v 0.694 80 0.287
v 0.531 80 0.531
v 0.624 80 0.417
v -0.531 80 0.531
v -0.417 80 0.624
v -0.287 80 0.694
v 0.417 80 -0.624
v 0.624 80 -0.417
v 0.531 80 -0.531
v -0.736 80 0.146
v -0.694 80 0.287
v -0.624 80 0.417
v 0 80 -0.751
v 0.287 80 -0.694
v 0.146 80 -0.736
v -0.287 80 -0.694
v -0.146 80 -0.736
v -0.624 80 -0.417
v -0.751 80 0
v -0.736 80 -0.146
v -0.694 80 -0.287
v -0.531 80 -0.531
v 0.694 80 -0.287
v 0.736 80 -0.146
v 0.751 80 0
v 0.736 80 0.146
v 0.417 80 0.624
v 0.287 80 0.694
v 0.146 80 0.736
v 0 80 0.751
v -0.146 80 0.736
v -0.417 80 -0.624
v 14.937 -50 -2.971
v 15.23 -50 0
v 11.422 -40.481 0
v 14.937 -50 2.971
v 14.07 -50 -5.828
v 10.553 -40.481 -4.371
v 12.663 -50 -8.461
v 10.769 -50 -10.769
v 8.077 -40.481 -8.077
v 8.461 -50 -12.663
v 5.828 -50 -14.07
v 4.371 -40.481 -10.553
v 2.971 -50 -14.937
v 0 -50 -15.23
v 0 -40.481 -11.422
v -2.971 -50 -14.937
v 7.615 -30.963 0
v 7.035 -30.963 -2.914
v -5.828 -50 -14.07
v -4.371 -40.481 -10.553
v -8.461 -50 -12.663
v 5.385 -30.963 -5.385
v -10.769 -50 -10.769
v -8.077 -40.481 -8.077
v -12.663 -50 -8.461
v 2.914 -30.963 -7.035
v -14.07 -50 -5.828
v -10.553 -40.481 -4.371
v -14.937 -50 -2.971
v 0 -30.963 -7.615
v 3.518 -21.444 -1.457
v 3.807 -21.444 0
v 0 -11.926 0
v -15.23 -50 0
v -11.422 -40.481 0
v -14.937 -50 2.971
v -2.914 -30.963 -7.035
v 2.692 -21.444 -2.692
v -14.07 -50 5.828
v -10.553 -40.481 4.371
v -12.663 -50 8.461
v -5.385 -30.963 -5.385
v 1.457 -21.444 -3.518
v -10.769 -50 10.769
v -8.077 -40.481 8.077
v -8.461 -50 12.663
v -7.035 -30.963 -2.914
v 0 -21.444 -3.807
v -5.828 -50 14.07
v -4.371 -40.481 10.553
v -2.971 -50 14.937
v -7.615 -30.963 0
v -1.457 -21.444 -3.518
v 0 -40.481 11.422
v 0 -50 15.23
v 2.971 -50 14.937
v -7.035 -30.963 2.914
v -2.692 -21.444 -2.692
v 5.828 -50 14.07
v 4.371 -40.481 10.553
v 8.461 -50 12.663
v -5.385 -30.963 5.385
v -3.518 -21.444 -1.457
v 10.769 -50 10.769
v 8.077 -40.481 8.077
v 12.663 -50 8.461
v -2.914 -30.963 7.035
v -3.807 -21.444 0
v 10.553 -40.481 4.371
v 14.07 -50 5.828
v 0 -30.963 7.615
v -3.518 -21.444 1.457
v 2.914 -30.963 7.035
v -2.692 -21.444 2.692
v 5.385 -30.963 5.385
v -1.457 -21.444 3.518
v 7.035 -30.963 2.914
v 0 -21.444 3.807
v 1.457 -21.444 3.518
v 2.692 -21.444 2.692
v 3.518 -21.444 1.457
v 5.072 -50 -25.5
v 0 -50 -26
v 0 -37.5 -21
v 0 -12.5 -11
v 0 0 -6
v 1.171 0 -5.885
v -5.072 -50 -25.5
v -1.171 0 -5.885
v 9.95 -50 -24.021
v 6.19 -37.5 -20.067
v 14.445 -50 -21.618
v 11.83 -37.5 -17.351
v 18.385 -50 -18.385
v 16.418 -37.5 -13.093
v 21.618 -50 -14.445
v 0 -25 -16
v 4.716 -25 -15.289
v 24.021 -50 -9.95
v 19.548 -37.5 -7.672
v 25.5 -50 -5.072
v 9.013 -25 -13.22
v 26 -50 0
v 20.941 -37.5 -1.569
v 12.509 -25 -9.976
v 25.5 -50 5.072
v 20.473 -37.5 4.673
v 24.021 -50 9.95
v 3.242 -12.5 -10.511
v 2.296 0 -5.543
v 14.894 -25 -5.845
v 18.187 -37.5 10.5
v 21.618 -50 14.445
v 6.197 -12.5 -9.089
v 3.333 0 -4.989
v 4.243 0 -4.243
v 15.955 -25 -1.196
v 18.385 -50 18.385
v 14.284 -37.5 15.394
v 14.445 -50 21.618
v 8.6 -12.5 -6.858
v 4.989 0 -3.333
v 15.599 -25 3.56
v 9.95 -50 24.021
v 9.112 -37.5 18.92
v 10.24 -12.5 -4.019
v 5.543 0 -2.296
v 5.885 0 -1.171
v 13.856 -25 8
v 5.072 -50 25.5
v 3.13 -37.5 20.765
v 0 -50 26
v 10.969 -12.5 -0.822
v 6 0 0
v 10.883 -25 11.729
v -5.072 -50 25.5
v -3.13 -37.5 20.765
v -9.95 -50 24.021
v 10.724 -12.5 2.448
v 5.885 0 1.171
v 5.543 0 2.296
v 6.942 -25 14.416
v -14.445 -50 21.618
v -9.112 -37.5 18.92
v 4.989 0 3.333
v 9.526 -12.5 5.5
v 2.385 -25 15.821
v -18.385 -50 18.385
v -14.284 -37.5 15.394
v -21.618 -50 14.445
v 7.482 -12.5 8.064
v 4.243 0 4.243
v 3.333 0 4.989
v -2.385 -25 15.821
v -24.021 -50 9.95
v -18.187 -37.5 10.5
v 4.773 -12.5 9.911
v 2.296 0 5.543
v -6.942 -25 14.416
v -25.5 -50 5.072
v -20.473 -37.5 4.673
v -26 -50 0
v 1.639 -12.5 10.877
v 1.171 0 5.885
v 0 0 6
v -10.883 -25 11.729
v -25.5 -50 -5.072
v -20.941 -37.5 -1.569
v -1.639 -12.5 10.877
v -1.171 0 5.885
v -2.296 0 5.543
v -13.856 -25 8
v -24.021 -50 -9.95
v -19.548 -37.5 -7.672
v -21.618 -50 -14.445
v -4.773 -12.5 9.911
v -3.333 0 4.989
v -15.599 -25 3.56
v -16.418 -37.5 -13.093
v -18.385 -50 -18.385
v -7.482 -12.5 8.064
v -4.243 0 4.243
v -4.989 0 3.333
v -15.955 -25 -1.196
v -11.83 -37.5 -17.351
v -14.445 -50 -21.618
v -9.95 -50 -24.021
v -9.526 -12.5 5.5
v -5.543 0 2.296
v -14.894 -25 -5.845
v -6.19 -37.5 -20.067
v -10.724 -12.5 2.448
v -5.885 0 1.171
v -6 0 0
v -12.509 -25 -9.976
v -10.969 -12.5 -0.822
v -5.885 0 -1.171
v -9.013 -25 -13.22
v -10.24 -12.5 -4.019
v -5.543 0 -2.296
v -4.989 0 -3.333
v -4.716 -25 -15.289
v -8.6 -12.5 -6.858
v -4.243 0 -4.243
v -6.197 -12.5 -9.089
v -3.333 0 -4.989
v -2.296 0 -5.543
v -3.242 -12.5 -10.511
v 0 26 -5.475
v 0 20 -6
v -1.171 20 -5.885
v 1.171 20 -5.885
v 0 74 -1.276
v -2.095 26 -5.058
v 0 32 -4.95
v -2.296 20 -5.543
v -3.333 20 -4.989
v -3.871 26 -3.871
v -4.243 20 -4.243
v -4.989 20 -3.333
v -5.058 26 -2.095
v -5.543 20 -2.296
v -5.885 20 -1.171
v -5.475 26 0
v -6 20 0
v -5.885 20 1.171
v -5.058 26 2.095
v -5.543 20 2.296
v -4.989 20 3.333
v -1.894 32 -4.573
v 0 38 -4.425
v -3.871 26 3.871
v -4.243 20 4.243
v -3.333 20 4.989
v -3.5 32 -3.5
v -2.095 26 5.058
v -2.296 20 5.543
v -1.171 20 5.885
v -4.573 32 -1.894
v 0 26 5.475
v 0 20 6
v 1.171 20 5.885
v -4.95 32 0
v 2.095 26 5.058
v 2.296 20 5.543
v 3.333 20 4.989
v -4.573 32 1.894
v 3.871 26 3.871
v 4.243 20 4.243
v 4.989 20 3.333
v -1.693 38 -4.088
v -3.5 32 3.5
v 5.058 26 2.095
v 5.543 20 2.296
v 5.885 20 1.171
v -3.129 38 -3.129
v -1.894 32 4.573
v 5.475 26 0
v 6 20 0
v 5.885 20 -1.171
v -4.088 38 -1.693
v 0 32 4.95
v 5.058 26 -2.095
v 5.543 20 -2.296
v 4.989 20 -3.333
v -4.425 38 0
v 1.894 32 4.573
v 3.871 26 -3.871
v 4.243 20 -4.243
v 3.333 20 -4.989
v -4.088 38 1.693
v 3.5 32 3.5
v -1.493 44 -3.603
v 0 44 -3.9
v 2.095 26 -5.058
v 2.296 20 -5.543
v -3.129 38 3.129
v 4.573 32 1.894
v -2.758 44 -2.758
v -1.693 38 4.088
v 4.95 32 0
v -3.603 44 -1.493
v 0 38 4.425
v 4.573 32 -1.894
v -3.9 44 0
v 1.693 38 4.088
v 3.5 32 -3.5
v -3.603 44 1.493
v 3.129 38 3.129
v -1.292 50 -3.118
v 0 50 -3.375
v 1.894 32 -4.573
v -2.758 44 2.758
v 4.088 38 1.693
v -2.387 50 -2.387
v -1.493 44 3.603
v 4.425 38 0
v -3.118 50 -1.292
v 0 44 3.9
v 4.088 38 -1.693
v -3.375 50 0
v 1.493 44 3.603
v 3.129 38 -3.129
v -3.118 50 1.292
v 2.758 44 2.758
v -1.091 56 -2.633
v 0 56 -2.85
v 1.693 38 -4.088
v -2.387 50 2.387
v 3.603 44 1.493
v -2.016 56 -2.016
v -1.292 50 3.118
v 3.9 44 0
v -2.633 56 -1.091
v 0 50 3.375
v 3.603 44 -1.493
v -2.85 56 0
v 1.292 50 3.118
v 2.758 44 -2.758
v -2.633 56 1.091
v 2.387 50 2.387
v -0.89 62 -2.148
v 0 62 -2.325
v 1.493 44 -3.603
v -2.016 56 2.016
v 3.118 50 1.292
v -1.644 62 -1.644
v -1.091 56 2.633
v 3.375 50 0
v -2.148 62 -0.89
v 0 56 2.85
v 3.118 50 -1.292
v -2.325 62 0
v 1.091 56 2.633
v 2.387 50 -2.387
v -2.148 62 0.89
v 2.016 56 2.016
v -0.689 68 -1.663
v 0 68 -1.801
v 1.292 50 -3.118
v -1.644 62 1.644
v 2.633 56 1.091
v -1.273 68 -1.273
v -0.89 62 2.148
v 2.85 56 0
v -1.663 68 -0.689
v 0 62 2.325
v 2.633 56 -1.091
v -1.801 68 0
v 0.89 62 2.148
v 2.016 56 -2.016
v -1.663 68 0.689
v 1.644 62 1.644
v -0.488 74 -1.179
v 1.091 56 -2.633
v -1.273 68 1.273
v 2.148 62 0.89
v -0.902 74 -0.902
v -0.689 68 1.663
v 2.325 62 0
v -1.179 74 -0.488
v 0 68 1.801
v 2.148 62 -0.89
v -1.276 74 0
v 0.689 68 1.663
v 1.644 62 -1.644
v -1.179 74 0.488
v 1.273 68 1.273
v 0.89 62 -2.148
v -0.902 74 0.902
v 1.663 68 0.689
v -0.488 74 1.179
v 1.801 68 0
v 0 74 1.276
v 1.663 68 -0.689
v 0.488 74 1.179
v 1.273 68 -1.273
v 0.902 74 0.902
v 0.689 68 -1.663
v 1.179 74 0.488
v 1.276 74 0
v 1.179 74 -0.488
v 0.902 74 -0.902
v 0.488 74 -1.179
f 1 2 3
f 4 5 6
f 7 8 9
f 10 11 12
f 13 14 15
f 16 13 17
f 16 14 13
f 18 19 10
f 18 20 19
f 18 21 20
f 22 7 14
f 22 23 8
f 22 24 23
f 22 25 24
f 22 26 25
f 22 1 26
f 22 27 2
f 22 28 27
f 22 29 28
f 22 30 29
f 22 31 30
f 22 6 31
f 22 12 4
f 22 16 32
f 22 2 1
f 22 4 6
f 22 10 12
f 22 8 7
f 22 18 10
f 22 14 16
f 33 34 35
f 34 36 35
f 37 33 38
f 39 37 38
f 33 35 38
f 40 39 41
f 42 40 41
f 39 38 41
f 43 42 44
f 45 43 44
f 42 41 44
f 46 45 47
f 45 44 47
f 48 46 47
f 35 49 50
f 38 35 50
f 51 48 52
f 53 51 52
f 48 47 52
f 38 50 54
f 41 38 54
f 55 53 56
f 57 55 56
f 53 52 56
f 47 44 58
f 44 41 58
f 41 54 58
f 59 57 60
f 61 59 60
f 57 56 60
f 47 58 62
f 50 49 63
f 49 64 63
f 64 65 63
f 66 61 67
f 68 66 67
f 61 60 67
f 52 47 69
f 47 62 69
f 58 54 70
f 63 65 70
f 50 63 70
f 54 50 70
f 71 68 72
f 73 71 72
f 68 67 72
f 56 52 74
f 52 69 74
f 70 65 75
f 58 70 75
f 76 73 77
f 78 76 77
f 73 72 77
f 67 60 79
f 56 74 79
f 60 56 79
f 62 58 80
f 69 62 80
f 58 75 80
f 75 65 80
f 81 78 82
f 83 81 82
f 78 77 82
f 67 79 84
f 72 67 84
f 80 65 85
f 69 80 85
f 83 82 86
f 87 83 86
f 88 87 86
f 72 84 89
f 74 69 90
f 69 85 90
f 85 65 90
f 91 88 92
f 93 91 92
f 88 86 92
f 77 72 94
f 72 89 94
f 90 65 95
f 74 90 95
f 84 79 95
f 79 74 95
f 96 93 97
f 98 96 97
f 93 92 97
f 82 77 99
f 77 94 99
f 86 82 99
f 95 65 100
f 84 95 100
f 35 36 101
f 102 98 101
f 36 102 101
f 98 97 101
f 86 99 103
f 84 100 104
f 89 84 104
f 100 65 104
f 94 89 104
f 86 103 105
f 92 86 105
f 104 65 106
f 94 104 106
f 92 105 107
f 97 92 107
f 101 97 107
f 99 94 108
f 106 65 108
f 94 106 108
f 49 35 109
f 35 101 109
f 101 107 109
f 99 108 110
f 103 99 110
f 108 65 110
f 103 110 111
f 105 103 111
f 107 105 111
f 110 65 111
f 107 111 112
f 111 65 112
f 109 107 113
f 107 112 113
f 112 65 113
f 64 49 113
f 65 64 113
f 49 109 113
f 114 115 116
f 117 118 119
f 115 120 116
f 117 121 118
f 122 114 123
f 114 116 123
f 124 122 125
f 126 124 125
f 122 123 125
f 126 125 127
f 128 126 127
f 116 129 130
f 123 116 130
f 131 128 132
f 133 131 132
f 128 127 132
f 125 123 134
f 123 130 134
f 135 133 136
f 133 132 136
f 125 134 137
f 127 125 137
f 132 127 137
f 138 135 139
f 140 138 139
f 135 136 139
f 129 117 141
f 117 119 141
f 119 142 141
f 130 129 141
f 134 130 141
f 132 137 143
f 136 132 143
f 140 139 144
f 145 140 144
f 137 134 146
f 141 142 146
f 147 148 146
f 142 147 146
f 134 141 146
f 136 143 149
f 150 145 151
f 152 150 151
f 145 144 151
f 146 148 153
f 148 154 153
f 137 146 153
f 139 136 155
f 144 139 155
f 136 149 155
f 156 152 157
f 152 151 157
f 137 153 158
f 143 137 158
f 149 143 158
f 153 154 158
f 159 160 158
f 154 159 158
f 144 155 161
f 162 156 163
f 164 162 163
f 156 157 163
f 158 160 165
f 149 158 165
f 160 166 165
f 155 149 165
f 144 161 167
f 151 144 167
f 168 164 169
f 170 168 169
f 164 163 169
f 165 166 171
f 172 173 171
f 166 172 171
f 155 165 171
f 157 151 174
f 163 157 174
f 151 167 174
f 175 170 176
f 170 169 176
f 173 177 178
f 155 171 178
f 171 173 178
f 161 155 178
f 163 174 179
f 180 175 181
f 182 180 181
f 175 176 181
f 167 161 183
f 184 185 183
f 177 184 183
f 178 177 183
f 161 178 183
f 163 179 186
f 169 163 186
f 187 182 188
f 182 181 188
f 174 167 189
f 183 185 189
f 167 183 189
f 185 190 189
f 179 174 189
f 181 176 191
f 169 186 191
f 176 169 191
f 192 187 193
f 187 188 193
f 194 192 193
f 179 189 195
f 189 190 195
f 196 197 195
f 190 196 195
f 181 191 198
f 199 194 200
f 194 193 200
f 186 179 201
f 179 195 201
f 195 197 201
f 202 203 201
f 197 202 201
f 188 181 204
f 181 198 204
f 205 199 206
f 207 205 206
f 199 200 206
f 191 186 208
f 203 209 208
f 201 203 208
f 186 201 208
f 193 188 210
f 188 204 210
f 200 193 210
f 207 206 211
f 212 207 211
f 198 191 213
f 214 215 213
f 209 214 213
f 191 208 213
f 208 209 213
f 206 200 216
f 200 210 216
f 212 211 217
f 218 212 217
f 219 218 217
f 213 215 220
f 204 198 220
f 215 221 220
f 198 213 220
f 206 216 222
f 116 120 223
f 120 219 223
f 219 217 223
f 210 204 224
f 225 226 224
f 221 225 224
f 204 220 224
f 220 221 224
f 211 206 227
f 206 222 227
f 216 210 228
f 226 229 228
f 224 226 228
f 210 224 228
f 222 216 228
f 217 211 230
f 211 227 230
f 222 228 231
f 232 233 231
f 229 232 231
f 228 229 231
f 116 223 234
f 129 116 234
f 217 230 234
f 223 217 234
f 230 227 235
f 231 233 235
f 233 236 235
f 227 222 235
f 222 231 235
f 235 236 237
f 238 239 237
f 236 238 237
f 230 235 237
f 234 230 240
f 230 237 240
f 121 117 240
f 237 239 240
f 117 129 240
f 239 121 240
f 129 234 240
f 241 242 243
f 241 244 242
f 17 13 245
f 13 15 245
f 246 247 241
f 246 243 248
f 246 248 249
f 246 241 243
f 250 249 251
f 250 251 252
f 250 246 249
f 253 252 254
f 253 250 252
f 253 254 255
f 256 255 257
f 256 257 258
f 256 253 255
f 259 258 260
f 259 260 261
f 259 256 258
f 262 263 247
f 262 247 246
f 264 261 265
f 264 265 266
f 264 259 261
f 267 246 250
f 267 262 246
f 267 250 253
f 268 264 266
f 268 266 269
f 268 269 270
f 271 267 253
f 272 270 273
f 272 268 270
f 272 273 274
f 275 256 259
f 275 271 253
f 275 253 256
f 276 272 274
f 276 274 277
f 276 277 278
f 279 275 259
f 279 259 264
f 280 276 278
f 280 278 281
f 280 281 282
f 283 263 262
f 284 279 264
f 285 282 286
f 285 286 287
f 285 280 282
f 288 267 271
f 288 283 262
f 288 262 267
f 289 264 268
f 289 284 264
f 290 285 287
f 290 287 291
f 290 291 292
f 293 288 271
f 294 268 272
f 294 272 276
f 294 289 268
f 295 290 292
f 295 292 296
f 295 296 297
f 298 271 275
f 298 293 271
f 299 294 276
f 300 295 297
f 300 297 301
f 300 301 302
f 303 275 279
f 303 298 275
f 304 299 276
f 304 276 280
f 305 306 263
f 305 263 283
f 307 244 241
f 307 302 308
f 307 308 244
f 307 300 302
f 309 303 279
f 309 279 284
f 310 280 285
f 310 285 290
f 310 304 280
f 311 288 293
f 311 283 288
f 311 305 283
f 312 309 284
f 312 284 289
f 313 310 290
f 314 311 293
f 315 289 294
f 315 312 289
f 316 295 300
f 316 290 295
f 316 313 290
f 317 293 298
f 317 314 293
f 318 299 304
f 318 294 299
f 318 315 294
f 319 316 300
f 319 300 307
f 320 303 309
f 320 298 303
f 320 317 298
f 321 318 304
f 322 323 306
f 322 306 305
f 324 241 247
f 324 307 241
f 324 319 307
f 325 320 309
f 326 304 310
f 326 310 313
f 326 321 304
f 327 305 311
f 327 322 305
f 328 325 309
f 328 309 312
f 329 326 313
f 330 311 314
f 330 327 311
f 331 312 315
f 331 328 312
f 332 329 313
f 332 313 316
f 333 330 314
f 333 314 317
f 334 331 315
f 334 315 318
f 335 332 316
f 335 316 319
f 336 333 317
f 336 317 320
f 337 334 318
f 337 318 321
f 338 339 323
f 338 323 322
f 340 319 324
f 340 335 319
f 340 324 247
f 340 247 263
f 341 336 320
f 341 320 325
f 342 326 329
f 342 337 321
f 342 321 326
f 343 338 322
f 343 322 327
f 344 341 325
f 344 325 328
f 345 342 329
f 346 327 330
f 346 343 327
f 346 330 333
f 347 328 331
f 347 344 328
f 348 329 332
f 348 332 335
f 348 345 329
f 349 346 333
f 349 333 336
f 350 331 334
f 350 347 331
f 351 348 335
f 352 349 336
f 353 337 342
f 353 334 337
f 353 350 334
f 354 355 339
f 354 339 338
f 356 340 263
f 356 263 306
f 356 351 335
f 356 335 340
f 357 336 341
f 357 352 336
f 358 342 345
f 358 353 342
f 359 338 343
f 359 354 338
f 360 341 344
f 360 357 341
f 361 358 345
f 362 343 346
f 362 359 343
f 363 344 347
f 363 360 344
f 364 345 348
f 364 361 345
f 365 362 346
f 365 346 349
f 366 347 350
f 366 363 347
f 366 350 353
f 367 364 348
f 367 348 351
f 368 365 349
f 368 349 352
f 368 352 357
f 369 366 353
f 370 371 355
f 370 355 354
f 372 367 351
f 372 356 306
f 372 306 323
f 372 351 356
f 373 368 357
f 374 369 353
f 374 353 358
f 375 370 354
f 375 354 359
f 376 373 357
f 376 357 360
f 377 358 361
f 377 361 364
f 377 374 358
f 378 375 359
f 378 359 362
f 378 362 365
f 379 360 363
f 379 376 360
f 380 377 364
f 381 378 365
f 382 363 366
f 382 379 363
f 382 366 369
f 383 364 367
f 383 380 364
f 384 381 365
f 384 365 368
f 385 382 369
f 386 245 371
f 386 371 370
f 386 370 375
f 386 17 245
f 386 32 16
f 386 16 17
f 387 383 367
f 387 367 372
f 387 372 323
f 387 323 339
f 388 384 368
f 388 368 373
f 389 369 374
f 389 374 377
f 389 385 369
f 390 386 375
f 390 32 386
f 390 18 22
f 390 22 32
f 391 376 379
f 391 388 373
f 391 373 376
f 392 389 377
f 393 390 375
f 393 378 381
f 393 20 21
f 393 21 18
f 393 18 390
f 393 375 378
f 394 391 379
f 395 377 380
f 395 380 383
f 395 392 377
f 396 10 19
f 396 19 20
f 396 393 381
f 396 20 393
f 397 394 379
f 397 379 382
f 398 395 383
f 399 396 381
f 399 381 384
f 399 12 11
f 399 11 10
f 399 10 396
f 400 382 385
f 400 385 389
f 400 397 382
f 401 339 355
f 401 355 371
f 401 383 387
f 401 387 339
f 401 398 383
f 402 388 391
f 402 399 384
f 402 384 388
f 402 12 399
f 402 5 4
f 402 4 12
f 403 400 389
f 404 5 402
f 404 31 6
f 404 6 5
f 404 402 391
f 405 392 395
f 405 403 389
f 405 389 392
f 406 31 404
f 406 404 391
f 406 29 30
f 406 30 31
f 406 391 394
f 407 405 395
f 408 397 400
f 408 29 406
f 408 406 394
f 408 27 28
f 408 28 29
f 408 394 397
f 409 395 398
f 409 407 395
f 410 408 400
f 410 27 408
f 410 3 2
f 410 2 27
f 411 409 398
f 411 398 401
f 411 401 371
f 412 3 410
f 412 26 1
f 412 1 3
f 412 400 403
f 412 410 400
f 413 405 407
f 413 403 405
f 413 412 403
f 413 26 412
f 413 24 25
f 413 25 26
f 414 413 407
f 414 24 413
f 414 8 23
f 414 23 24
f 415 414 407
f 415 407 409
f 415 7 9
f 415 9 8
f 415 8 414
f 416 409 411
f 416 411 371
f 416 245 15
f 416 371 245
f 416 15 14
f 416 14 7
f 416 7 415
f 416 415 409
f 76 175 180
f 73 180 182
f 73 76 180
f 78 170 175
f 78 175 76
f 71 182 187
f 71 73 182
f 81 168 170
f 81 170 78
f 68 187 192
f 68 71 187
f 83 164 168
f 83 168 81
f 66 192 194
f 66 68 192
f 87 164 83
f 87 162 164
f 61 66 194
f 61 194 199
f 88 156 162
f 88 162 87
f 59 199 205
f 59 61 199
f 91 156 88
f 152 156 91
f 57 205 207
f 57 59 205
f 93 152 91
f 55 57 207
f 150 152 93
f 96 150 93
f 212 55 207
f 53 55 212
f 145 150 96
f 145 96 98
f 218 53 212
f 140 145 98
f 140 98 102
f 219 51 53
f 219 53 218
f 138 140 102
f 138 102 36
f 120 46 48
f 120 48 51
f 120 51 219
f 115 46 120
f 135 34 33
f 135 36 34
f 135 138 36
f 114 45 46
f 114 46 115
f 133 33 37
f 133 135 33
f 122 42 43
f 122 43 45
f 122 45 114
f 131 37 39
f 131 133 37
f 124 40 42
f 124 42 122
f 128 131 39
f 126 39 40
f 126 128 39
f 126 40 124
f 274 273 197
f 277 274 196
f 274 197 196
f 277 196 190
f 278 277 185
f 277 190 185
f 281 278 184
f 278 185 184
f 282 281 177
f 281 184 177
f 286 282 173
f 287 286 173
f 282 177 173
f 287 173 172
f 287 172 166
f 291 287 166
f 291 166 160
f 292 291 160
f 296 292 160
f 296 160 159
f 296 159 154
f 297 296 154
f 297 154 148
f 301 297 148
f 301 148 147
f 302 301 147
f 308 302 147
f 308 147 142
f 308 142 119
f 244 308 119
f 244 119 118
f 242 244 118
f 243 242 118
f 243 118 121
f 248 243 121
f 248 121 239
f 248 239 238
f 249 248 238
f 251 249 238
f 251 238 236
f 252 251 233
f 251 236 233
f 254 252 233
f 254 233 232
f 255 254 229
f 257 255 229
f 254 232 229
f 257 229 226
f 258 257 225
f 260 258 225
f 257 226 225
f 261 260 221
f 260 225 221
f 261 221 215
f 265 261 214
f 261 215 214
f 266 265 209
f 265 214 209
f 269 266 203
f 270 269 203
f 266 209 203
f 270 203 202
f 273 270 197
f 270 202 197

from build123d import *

# Parameters (mm, degrees)
SKETCH1_R           = 6
BOSS_EXTRUDE1_DEPTH = 20
SKETCH2_R           = 26
BOSS_EXTRUDE2_DEPTH = 50
CHAMFER1_SIZE       = 50
CHAMFER1_SIZE_2     = 20
SKETCH3_R           = 6
BOSS_EXTRUDE3_DEPTH = 60
BOSS_EXTRUDE3_TAPER = 5


# Read off the part's stored shape, not the designer's step: Shell1
with BuildPart() as part:
    # Sketch1 → Boss-Extrude1 (new body)
    with BuildSketch(Plane(origin=(0, 0, 0), x_dir=(1, 0, 0), z_dir=(0, 1, 0))):
        with Locations(Location((0, 0, 0), (0, 0, 270))):
            Circle(SKETCH1_R)
    extrude(amount=BOSS_EXTRUDE1_DEPTH)

    # Sketch2 → Boss-Extrude2 (add)
    with BuildSketch(Plane.XZ):
        with Locations(Location((0, 0, 0), (0, 0, 270))):
            Circle(SKETCH2_R)
    extrude(amount=BOSS_EXTRUDE2_DEPTH)

    # Chamfer1
    # the kernel refuses this chamfer: 50, 20 mm, written as the material it takes off along each edge
    with BuildSketch(Plane(origin=(0, 0, 0), x_dir=(0, 0, -1), z_dir=(-1, 0, 0))) as chamfer1_piece_1:
        Polygon((26, CHAMFER1_SIZE), (26 - CHAMFER1_SIZE_2, 0), (26, 0), align=None)
    revolve(axis=Axis((0, 0, 0), (0, -1, 0)), mode=Mode.SUBTRACT)

    # Shell1 outline → Shell1 (revolve, cut)
    with BuildSketch(Plane.XY):
        Polygon((15.229670386, -50), (0, -11.925824036), (0, -50), align=None)
    revolve(axis=Axis((0, 0, 0), (0, 1, 0)), mode=Mode.SUBTRACT)

    # Sketch3 → Boss-Extrude3 (add)
    with BuildSketch(Plane(origin=(0, 20, 0), x_dir=(1, 0, 0), z_dir=(0, 1, 0))):
        with Locations(Location((0, 0, 0), (0, 0, 90))):
            Circle(SKETCH3_R)
    extrude(amount=BOSS_EXTRUDE3_DEPTH, taper=BOSS_EXTRUDE3_TAPER)


solid = part.part
